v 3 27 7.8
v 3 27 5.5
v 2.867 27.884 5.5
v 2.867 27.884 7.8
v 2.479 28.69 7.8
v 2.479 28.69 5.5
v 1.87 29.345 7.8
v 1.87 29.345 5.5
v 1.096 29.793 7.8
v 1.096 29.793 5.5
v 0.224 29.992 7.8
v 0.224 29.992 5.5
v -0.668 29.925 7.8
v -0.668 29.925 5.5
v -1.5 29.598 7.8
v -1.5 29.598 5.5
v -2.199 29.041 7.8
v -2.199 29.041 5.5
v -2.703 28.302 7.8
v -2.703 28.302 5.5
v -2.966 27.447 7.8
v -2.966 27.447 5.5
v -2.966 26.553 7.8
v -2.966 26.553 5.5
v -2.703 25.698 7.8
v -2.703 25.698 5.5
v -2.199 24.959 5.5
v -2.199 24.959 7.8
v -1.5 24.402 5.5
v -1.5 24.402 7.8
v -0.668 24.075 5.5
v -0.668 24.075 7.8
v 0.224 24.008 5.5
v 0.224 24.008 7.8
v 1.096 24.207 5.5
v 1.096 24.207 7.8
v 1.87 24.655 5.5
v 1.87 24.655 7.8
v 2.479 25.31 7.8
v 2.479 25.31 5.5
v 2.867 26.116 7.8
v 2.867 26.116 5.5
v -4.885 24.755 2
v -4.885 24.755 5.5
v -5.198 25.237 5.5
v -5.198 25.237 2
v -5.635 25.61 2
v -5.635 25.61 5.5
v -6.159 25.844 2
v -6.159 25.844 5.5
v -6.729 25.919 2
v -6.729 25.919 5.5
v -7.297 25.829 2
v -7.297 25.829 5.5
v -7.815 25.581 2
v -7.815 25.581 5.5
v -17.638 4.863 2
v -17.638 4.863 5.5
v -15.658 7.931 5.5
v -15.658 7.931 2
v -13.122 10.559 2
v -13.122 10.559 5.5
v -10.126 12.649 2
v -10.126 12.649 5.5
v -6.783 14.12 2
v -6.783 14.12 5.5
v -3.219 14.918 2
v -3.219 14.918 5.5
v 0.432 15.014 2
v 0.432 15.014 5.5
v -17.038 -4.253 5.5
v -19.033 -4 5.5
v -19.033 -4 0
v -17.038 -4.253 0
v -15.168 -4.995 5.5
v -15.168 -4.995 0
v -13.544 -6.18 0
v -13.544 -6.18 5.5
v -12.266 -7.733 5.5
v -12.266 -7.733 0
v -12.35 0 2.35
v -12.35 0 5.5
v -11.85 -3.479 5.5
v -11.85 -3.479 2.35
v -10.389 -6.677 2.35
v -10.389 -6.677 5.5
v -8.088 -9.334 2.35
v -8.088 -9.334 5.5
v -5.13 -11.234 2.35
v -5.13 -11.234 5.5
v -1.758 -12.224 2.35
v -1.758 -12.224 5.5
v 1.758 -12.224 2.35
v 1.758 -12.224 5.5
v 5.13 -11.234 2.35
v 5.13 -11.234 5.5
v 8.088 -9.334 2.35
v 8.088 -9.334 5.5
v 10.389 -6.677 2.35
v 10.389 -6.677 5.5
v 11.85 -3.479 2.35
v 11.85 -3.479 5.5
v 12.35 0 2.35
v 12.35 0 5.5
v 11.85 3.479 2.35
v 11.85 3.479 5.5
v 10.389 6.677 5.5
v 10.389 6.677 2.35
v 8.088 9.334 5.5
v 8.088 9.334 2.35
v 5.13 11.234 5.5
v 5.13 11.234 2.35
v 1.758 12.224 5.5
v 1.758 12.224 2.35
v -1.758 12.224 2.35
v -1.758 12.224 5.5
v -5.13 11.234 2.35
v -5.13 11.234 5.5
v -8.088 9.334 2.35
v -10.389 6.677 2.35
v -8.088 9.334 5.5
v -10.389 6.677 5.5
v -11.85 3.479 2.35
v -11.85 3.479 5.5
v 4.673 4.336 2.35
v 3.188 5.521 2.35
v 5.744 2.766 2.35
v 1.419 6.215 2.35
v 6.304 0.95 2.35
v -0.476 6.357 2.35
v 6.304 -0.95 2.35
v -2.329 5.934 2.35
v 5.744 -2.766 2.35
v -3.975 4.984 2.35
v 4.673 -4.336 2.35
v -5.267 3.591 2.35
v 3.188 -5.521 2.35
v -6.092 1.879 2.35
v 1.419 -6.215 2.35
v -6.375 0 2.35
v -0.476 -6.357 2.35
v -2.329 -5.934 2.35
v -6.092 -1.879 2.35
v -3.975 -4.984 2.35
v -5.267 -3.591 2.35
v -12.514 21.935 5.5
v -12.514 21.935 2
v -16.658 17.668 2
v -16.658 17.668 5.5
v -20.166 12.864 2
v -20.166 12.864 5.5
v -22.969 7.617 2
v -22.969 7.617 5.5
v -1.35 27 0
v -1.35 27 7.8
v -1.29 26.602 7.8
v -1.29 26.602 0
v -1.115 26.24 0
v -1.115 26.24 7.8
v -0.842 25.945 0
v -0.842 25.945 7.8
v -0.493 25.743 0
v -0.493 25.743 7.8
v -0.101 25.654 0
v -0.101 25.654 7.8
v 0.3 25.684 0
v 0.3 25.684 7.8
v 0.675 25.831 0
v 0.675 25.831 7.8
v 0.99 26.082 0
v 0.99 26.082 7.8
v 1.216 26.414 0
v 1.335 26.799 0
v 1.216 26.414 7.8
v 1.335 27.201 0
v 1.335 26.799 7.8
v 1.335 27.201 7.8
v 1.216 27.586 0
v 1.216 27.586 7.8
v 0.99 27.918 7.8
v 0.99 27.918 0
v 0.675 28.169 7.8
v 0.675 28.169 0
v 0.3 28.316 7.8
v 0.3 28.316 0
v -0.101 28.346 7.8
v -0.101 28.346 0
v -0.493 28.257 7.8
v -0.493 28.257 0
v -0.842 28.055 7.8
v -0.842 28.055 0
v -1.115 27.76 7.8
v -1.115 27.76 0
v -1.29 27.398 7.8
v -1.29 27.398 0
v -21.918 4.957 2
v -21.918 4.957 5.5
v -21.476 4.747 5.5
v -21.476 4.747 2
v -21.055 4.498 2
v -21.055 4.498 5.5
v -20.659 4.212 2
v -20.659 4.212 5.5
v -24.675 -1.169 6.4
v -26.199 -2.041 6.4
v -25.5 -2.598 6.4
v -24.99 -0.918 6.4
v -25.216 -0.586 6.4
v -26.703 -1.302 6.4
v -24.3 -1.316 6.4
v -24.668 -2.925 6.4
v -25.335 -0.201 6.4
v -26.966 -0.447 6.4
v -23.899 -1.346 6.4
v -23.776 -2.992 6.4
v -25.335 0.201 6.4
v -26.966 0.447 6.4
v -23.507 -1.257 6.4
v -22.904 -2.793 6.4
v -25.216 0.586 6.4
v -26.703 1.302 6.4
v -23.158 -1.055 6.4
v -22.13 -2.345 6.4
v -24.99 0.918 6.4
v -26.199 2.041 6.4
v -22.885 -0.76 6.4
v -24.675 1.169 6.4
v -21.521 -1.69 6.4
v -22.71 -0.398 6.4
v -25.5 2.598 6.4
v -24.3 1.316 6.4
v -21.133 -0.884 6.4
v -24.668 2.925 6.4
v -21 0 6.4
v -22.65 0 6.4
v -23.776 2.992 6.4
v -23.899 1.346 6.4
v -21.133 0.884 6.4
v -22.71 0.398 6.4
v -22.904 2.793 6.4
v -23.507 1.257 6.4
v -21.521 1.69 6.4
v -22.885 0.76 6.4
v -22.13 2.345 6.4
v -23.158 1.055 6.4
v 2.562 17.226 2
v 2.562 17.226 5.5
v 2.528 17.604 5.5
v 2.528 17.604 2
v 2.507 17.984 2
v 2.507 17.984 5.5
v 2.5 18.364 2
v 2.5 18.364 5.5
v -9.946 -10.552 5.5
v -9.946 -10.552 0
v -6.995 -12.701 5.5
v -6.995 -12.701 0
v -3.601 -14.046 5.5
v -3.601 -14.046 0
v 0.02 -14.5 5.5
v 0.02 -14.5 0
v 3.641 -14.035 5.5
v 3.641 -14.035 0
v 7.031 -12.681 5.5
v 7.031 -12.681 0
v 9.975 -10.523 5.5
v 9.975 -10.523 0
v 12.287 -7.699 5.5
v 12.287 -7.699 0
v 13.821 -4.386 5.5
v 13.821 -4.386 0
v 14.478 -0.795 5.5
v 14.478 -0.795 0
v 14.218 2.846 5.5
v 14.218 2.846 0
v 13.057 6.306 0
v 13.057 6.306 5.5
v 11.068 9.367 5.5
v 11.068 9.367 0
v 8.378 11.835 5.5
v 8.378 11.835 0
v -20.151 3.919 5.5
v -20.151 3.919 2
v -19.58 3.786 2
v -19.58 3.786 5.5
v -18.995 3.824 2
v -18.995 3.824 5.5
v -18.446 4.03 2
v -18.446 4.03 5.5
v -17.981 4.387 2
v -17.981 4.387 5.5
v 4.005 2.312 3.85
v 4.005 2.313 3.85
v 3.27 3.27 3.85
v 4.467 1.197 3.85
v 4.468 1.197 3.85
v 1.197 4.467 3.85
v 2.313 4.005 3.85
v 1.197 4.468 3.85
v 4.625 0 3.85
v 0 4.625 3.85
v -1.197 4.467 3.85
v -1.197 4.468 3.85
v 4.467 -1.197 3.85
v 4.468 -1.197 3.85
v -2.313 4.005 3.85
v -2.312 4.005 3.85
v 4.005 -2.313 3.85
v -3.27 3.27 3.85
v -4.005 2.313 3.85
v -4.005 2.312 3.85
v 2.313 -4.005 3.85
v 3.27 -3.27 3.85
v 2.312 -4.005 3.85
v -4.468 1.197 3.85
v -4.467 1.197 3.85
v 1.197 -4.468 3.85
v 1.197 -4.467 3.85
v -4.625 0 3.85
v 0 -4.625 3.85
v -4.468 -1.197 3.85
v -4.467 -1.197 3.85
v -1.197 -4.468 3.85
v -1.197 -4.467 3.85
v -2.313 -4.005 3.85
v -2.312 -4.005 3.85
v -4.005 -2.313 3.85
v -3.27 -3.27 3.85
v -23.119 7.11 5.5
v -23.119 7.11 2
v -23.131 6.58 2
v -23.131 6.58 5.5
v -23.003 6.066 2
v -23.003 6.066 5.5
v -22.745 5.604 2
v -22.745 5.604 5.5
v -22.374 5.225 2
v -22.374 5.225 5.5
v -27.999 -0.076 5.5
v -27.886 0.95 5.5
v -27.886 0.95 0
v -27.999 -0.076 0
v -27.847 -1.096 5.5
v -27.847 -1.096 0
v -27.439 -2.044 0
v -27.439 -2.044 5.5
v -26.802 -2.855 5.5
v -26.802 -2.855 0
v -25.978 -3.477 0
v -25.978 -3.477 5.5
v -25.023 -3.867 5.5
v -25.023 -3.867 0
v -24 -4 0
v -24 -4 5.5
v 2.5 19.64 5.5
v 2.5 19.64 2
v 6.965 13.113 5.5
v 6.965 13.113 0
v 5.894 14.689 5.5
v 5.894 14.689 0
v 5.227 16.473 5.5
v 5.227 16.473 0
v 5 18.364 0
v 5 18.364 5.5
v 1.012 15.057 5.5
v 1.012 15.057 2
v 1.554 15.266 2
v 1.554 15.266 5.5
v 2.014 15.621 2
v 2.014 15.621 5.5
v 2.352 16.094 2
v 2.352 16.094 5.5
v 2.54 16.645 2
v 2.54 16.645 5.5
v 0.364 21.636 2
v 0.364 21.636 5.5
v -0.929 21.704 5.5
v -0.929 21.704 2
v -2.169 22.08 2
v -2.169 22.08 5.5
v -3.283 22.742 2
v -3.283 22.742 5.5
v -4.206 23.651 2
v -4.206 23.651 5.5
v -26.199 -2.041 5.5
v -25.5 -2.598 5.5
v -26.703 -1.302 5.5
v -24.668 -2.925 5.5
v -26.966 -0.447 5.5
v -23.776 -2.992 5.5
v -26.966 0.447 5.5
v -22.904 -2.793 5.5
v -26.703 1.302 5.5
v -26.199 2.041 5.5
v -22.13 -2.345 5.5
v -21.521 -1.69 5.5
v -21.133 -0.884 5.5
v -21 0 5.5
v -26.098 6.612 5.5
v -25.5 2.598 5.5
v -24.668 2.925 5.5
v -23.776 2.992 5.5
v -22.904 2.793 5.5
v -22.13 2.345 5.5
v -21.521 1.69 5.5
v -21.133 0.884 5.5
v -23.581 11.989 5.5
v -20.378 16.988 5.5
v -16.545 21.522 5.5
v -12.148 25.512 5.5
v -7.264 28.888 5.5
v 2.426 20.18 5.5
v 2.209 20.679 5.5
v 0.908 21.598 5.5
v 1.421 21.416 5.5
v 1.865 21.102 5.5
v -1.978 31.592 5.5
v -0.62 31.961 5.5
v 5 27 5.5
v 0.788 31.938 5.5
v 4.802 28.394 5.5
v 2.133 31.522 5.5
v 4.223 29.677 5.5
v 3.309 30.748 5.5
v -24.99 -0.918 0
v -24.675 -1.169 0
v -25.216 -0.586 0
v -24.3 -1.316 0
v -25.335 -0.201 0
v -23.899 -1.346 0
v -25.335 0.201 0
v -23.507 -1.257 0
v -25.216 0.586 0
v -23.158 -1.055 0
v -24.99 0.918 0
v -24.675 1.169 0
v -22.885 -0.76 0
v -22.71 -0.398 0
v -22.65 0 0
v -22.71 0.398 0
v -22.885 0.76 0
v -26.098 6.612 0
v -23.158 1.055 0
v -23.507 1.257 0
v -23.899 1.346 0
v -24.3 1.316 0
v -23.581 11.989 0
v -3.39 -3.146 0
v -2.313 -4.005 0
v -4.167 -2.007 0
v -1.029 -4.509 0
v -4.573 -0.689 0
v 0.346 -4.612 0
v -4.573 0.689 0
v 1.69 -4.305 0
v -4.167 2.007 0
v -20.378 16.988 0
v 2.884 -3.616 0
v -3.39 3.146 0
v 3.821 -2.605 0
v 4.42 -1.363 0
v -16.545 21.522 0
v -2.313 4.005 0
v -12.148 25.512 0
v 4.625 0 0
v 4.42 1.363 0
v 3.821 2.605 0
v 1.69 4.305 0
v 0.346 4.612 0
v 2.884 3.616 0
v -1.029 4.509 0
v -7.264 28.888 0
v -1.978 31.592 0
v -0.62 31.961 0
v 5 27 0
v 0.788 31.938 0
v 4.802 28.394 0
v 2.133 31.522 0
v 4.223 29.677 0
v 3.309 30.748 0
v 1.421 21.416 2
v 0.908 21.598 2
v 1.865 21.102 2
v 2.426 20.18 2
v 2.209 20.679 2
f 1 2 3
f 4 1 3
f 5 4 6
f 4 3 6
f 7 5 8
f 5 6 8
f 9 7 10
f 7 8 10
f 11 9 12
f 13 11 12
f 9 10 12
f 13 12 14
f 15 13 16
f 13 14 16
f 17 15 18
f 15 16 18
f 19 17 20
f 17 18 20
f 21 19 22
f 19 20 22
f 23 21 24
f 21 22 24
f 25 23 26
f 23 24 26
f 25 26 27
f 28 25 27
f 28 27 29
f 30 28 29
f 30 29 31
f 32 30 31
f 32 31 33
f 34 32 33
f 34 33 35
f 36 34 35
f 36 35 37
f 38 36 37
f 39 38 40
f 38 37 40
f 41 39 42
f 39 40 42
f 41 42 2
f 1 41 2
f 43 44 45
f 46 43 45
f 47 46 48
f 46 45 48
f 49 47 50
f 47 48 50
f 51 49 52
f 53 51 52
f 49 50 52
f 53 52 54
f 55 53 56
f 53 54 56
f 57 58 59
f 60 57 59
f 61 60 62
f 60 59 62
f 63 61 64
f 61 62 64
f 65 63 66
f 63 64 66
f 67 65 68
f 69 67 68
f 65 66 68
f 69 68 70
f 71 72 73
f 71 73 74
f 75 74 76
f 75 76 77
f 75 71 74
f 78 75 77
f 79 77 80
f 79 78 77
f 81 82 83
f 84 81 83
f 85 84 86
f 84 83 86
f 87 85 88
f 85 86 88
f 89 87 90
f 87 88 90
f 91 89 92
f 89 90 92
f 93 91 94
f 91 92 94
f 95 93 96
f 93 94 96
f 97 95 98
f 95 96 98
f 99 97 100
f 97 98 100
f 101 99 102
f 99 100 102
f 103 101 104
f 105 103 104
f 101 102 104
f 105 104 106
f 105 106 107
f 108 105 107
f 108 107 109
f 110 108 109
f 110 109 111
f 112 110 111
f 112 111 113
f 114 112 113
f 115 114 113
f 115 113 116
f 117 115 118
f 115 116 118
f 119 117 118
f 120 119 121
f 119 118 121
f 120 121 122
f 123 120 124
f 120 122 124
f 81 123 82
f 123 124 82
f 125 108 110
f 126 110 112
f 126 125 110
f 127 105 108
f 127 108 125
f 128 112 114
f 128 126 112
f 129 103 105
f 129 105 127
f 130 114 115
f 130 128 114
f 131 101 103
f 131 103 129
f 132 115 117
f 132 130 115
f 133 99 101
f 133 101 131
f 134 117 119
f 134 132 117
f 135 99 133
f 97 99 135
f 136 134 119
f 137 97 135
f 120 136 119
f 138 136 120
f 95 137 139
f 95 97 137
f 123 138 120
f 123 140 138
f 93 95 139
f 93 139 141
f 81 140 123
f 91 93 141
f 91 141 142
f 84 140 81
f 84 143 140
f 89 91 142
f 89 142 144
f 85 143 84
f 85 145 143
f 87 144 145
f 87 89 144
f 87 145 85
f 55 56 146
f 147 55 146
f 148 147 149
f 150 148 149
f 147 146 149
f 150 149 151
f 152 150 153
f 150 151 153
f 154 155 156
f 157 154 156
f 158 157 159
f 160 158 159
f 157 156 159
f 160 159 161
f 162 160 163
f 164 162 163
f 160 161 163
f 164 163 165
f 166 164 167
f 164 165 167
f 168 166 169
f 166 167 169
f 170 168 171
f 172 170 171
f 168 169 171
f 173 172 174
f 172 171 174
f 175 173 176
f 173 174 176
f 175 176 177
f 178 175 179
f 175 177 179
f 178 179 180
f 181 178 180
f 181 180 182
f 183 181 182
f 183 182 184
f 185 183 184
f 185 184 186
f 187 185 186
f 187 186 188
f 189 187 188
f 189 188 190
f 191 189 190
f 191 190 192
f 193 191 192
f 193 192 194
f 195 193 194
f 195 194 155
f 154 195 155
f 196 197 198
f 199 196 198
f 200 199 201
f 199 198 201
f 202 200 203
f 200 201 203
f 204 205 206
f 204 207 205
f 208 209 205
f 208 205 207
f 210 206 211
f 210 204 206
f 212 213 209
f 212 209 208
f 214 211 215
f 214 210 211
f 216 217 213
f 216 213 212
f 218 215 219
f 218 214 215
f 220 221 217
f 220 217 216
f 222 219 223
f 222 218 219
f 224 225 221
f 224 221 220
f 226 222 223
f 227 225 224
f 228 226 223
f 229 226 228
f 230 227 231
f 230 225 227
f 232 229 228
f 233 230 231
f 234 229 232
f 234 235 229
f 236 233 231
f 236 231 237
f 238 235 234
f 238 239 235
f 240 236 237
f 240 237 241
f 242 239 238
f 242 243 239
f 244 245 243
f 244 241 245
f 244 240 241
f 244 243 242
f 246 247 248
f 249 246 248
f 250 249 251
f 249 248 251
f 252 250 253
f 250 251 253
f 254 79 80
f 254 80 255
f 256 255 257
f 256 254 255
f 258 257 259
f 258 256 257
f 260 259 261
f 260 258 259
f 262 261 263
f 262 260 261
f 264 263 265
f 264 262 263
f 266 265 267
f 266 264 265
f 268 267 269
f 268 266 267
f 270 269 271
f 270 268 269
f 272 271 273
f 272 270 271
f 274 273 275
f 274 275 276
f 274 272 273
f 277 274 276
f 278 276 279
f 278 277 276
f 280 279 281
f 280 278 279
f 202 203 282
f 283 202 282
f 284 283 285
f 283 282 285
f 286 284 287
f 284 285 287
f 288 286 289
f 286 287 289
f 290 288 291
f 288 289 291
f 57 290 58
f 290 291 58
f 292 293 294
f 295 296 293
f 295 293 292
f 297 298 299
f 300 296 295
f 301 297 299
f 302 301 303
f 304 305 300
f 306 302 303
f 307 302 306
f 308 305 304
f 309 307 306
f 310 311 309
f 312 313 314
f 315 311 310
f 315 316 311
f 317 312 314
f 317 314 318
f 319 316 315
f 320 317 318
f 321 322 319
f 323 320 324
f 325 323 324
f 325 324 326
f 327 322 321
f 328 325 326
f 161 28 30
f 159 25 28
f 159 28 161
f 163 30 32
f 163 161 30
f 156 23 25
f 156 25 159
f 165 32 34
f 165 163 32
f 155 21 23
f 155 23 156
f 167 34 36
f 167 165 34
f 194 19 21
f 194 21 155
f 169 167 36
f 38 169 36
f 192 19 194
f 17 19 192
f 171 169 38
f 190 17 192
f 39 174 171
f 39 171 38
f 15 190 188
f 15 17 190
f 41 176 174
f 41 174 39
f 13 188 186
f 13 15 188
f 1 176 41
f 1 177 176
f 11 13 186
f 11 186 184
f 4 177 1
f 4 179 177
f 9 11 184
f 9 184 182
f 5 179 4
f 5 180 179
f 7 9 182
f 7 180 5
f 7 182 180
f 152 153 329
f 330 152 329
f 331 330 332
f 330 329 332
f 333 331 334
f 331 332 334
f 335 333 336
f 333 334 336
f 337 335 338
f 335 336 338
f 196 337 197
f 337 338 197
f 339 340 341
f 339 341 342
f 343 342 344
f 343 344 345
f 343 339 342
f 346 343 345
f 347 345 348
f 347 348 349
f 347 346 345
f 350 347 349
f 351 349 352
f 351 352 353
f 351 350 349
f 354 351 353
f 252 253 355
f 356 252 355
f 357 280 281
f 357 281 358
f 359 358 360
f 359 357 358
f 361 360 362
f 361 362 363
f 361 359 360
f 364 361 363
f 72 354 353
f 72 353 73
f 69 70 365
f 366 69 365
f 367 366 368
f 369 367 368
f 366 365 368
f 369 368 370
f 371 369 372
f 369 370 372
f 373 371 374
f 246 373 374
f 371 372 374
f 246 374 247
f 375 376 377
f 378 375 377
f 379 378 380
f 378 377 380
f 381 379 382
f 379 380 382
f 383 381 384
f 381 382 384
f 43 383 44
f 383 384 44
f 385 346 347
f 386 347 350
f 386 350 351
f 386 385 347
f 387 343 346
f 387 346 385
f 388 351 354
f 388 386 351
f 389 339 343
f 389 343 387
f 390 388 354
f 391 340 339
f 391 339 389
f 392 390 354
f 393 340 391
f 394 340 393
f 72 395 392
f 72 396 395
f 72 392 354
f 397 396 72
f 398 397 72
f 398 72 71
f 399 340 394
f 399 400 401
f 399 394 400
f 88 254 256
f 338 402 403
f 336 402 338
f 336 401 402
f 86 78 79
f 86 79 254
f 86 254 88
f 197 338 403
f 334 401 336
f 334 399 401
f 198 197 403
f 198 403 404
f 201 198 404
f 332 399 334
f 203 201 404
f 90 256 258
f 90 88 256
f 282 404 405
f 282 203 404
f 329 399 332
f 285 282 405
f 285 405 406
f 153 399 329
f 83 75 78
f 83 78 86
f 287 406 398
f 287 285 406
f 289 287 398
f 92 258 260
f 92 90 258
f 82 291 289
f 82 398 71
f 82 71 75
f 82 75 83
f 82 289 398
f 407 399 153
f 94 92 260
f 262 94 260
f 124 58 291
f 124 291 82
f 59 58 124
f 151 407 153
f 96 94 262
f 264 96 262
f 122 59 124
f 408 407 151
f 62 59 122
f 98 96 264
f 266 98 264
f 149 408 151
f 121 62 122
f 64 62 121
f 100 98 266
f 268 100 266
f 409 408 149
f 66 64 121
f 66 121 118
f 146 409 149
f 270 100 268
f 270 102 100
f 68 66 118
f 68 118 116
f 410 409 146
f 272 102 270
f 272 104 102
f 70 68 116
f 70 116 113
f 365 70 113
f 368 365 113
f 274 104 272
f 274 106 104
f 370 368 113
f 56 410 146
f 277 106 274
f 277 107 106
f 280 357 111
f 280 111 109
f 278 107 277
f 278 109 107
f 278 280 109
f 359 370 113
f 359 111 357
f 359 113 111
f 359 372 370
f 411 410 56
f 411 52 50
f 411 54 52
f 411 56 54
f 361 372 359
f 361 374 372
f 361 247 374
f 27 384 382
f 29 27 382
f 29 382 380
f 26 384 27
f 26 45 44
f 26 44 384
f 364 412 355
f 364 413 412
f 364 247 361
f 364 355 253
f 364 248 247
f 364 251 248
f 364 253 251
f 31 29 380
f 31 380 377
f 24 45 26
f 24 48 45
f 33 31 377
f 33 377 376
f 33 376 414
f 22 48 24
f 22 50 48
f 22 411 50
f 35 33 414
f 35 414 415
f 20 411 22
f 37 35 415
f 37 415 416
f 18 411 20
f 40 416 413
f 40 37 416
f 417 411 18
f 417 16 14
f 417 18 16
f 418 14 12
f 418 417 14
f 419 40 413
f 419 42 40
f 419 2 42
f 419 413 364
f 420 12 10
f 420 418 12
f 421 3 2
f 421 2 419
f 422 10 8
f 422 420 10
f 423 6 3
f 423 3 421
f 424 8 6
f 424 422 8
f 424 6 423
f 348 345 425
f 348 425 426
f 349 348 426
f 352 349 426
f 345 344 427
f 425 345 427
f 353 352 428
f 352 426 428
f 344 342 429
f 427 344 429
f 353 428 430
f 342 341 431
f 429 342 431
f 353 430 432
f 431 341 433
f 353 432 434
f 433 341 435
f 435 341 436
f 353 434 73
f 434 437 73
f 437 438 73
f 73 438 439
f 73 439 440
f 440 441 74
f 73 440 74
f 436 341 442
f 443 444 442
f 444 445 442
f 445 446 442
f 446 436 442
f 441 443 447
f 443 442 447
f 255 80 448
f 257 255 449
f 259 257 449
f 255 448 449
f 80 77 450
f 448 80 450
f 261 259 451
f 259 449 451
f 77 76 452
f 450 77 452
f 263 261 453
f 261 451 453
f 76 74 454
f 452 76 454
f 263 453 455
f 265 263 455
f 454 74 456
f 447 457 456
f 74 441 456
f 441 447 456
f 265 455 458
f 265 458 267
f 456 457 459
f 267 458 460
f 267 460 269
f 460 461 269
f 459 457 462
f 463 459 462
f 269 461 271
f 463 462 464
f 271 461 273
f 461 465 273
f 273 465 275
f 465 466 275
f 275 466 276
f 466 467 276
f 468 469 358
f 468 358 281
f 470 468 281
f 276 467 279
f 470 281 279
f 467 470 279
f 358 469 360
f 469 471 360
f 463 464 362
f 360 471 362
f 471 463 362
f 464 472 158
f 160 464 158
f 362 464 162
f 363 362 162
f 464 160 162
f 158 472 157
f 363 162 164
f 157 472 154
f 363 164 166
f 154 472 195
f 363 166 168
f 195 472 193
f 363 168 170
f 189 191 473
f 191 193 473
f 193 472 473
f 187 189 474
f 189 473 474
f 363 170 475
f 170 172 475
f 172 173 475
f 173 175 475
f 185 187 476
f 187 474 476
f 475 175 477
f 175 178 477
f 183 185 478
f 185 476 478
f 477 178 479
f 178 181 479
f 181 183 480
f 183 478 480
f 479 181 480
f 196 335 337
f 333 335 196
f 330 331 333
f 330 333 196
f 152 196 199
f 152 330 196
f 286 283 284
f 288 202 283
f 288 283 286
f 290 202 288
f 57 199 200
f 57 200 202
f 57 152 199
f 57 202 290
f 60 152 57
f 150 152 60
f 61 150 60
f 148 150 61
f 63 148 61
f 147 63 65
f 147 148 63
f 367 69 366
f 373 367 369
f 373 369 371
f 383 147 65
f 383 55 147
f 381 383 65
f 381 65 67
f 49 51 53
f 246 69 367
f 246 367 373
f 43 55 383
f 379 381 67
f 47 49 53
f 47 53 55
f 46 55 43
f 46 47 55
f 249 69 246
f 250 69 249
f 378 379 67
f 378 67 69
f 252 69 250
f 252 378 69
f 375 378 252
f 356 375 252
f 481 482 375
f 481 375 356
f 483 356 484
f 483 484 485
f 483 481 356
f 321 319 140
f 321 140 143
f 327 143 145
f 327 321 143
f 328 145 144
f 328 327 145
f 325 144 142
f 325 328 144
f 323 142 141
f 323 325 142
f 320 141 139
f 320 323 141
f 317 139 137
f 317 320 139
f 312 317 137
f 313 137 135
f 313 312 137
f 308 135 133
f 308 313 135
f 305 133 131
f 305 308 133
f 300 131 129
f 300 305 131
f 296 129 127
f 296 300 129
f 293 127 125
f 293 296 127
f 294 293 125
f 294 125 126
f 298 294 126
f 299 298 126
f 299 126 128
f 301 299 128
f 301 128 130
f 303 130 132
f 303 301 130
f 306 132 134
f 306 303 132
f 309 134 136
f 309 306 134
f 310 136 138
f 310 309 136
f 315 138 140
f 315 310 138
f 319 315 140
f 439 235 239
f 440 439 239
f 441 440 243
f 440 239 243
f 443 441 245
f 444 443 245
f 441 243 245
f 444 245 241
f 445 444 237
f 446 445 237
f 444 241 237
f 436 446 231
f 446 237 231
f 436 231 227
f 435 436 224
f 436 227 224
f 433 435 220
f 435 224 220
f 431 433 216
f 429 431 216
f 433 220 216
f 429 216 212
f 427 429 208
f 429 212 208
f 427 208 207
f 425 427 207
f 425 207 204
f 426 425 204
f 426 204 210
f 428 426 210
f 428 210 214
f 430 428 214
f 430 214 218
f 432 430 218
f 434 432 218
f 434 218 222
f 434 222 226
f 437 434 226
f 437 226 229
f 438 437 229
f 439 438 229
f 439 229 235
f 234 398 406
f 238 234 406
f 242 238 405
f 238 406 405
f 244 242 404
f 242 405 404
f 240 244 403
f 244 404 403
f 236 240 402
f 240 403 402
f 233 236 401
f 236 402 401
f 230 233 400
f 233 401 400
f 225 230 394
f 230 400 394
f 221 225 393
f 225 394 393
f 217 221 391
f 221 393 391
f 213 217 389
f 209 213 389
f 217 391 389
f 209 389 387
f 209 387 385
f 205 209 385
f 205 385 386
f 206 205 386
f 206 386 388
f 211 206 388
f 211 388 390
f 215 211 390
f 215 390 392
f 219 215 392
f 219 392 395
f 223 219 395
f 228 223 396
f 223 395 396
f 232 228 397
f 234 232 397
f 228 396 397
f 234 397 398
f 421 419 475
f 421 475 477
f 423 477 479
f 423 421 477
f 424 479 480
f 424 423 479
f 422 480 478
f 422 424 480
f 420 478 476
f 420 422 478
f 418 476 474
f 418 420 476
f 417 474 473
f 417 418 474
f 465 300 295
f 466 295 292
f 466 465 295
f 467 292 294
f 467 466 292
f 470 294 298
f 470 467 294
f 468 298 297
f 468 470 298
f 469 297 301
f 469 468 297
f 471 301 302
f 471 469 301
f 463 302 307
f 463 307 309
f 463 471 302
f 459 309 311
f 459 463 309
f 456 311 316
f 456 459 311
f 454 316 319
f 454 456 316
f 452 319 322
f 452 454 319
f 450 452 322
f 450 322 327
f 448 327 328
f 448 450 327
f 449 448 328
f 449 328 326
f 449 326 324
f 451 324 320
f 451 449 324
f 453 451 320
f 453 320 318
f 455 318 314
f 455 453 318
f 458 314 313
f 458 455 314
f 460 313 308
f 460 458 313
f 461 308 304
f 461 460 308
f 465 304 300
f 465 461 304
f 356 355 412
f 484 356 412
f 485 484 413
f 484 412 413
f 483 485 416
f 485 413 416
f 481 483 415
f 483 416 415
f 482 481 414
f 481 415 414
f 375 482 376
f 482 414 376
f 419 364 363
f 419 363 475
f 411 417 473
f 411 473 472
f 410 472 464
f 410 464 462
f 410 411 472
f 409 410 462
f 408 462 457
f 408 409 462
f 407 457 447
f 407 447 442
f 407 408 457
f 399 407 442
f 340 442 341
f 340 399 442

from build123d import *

# Parameters (mm, degrees)
BOSS_EXTRUDE1_DEPTH = 5.5
SKETCH2_R           = 3
BOSS_EXTRUDE2_DEPTH = 2.3
SKETCH3_R           = 3
BOSS_EXTRUDE3_DEPTH = 0.9
SKETCH4_R           = 4.625
CUT_EXTRUDE1_DEPTH  = 44.230082119
SKETCH5_R           = 1.35
CUT_EXTRUDE2_DEPTH  = 44.230082119
SKETCH7_R           = 12.35
CUT_EXTRUDE4_DEPTH  = 3.15
CUT_EXTRUDE5_DEPTH  = 3.5
SKETCH9_R           = 6.375
SKETCH9_R_2         = 4.625
BOSS_EXTRUDE4_DEPTH = 1.5
CHAMFER1_SIZE2      = 1.75
CHAMFER1_SIZE       = 1.5


with BuildPart() as part:
    # Sketch1 → Boss-Extrude1 (new body)
    with BuildSketch(Plane.XY.offset(5.5)):
        with BuildLine():
            Line((5, 18.364367672), (5, 27))
            ThreePointArc((5, 27), (2.748443387, 31.176847968), (-1.978423579, 31.591932071))
            ThreePointArc((-1.978423579, 31.591932071), (-18.536483892, 19.318360138), (-27.885598891, 0.94980064))
            ThreePointArc((-27.885598891, 0.94980064), (-27.146363183, -2.469898524), (-24, -4))
            Line((-24, -4), (-19.032866311, -4))
            ThreePointArc((-19.032866311, -4), (-15.168499178, -4.995239714), (-12.265624956, -7.733333333))
            ThreePointArc((-12.265624956, -7.733333333), (9.975316712, -10.523452689), (8.377777778, 11.834814722))
            ThreePointArc((8.377777778, 11.834814722), (5.894446616, 14.688621338), (5, 18.364367672))
        make_face()
    extrude(amount=-BOSS_EXTRUDE1_DEPTH)

    # Sketch2 → Boss-Extrude2 (add)
    with BuildSketch(Plane.XY.offset(5.5)):
        with Locations((0, 27)):
            Circle(SKETCH2_R)
    extrude(amount=BOSS_EXTRUDE2_DEPTH)

    # Sketch3 → Boss-Extrude3 (add)
    with BuildSketch(Plane.XY.offset(5.5)):
        with Locations((-24, 0)):
            Circle(SKETCH3_R)
    extrude(amount=BOSS_EXTRUDE3_DEPTH)

    # Sketch4 → Cut-Extrude1 (cut, through all)
    with BuildSketch(Plane(origin=(0, 0, 0), x_dir=(-1, 0, 0), z_dir=(0, 0, -1))):
        with Locations(Location((0, 0, 0), (0, 0, 180))):
            Circle(SKETCH4_R)
    extrude(amount=-CUT_EXTRUDE1_DEPTH, mode=Mode.SUBTRACT)

    # Sketch5 → Cut-Extrude2 (cut, through all)
    with BuildSketch(Plane.XY.offset(7.8)):
        with Locations(Location((0, 27, 0), (0, 0, 180))):
            Circle(SKETCH5_R)
        with Locations((-24, 0)):
            Circle(SKETCH5_R)
    extrude(amount=-CUT_EXTRUDE2_DEPTH, mode=Mode.SUBTRACT)

    # Sketch7 → Cut-Extrude4 (cut)
    with BuildSketch(Plane.XY.offset(5.5)):
        with Locations(Location((0, 0, 0), (0, 0, 180))):
            Circle(SKETCH7_R)
    extrude(amount=-CUT_EXTRUDE4_DEPTH, mode=Mode.SUBTRACT)

    # Sketch8 → Cut-Extrude5 (cut)
    with BuildSketch(Plane.XY.offset(5.5)):
        with BuildLine():
            Line((2.5, 18.364367672), (2.5, 19.640321115))
            ThreePointArc((2.5, 19.640321115), (1.865443882, 21.101677678), (0.364436994, 21.635721494))
            ThreePointArc((0.364436994, 21.635721494), (-2.746191158, 22.377583712), (-4.885348815, 24.754634735))
            ThreePointArc((-4.885348815, 24.754634735), (-6.159449386, 25.844240566), (-7.815189176, 25.581373906))
            ThreePointArc((-7.815189176, 25.581373906), (-16.658270057, 17.667681565), (-22.968564749, 7.617468292))
            ThreePointArc((-22.968564749, 7.617468292), (-23.002979343, 6.066010594), (-21.917514319, 4.956970002))
            ThreePointArc((-21.917514319, 4.956970002), (-21.262726036, 4.627702396), (-20.658800912, 4.212444287))
            ThreePointArc((-20.658800912, 4.212444287), (-18.994988647, 3.824188919), (-17.638370065, 4.862745371))
            ThreePointArc((-17.638370065, 4.862745371), (-10.125827676, 12.648544298), (0.431762956, 15.013758475))
            ThreePointArc((0.431762956, 15.013758475), (2.014294705, 15.621352145), (2.561932671, 17.225618165))
            ThreePointArc((2.561932671, 17.225618165), (2.5154946, 17.794151464), (2.5, 18.364367672))
        make_face()
    extrude(amount=-CUT_EXTRUDE5_DEPTH, mode=Mode.SUBTRACT)

    # Sketch9 → Boss-Extrude4 (add)
    with BuildSketch(Plane.XY.offset(2.35)):
        with Locations(Location((0, 0, 0), (0, 0, 180))):
            Circle(SKETCH9_R)
        Circle(SKETCH9_R_2, mode=Mode.SUBTRACT)
    extrude(amount=BOSS_EXTRUDE4_DEPTH)

    # Chamfer1
    chamfer1_edges = [part.edges().sort_by_distance(p)[0] for p in [
        (6.375, 0, 3.85),
    ]]
    chamfer1_side = [part.faces().sort_by_distance(p)[0] for p in [
        (6.375, 0, 3.82),
    ]]
    chamfer(chamfer1_edges, length=CHAMFER1_SIZE - 0.0001, length2=CHAMFER1_SIZE2 - 0.0001, reference=chamfer1_side[0])  # a hair under: the kernel refuses the full size


solid = part.part
